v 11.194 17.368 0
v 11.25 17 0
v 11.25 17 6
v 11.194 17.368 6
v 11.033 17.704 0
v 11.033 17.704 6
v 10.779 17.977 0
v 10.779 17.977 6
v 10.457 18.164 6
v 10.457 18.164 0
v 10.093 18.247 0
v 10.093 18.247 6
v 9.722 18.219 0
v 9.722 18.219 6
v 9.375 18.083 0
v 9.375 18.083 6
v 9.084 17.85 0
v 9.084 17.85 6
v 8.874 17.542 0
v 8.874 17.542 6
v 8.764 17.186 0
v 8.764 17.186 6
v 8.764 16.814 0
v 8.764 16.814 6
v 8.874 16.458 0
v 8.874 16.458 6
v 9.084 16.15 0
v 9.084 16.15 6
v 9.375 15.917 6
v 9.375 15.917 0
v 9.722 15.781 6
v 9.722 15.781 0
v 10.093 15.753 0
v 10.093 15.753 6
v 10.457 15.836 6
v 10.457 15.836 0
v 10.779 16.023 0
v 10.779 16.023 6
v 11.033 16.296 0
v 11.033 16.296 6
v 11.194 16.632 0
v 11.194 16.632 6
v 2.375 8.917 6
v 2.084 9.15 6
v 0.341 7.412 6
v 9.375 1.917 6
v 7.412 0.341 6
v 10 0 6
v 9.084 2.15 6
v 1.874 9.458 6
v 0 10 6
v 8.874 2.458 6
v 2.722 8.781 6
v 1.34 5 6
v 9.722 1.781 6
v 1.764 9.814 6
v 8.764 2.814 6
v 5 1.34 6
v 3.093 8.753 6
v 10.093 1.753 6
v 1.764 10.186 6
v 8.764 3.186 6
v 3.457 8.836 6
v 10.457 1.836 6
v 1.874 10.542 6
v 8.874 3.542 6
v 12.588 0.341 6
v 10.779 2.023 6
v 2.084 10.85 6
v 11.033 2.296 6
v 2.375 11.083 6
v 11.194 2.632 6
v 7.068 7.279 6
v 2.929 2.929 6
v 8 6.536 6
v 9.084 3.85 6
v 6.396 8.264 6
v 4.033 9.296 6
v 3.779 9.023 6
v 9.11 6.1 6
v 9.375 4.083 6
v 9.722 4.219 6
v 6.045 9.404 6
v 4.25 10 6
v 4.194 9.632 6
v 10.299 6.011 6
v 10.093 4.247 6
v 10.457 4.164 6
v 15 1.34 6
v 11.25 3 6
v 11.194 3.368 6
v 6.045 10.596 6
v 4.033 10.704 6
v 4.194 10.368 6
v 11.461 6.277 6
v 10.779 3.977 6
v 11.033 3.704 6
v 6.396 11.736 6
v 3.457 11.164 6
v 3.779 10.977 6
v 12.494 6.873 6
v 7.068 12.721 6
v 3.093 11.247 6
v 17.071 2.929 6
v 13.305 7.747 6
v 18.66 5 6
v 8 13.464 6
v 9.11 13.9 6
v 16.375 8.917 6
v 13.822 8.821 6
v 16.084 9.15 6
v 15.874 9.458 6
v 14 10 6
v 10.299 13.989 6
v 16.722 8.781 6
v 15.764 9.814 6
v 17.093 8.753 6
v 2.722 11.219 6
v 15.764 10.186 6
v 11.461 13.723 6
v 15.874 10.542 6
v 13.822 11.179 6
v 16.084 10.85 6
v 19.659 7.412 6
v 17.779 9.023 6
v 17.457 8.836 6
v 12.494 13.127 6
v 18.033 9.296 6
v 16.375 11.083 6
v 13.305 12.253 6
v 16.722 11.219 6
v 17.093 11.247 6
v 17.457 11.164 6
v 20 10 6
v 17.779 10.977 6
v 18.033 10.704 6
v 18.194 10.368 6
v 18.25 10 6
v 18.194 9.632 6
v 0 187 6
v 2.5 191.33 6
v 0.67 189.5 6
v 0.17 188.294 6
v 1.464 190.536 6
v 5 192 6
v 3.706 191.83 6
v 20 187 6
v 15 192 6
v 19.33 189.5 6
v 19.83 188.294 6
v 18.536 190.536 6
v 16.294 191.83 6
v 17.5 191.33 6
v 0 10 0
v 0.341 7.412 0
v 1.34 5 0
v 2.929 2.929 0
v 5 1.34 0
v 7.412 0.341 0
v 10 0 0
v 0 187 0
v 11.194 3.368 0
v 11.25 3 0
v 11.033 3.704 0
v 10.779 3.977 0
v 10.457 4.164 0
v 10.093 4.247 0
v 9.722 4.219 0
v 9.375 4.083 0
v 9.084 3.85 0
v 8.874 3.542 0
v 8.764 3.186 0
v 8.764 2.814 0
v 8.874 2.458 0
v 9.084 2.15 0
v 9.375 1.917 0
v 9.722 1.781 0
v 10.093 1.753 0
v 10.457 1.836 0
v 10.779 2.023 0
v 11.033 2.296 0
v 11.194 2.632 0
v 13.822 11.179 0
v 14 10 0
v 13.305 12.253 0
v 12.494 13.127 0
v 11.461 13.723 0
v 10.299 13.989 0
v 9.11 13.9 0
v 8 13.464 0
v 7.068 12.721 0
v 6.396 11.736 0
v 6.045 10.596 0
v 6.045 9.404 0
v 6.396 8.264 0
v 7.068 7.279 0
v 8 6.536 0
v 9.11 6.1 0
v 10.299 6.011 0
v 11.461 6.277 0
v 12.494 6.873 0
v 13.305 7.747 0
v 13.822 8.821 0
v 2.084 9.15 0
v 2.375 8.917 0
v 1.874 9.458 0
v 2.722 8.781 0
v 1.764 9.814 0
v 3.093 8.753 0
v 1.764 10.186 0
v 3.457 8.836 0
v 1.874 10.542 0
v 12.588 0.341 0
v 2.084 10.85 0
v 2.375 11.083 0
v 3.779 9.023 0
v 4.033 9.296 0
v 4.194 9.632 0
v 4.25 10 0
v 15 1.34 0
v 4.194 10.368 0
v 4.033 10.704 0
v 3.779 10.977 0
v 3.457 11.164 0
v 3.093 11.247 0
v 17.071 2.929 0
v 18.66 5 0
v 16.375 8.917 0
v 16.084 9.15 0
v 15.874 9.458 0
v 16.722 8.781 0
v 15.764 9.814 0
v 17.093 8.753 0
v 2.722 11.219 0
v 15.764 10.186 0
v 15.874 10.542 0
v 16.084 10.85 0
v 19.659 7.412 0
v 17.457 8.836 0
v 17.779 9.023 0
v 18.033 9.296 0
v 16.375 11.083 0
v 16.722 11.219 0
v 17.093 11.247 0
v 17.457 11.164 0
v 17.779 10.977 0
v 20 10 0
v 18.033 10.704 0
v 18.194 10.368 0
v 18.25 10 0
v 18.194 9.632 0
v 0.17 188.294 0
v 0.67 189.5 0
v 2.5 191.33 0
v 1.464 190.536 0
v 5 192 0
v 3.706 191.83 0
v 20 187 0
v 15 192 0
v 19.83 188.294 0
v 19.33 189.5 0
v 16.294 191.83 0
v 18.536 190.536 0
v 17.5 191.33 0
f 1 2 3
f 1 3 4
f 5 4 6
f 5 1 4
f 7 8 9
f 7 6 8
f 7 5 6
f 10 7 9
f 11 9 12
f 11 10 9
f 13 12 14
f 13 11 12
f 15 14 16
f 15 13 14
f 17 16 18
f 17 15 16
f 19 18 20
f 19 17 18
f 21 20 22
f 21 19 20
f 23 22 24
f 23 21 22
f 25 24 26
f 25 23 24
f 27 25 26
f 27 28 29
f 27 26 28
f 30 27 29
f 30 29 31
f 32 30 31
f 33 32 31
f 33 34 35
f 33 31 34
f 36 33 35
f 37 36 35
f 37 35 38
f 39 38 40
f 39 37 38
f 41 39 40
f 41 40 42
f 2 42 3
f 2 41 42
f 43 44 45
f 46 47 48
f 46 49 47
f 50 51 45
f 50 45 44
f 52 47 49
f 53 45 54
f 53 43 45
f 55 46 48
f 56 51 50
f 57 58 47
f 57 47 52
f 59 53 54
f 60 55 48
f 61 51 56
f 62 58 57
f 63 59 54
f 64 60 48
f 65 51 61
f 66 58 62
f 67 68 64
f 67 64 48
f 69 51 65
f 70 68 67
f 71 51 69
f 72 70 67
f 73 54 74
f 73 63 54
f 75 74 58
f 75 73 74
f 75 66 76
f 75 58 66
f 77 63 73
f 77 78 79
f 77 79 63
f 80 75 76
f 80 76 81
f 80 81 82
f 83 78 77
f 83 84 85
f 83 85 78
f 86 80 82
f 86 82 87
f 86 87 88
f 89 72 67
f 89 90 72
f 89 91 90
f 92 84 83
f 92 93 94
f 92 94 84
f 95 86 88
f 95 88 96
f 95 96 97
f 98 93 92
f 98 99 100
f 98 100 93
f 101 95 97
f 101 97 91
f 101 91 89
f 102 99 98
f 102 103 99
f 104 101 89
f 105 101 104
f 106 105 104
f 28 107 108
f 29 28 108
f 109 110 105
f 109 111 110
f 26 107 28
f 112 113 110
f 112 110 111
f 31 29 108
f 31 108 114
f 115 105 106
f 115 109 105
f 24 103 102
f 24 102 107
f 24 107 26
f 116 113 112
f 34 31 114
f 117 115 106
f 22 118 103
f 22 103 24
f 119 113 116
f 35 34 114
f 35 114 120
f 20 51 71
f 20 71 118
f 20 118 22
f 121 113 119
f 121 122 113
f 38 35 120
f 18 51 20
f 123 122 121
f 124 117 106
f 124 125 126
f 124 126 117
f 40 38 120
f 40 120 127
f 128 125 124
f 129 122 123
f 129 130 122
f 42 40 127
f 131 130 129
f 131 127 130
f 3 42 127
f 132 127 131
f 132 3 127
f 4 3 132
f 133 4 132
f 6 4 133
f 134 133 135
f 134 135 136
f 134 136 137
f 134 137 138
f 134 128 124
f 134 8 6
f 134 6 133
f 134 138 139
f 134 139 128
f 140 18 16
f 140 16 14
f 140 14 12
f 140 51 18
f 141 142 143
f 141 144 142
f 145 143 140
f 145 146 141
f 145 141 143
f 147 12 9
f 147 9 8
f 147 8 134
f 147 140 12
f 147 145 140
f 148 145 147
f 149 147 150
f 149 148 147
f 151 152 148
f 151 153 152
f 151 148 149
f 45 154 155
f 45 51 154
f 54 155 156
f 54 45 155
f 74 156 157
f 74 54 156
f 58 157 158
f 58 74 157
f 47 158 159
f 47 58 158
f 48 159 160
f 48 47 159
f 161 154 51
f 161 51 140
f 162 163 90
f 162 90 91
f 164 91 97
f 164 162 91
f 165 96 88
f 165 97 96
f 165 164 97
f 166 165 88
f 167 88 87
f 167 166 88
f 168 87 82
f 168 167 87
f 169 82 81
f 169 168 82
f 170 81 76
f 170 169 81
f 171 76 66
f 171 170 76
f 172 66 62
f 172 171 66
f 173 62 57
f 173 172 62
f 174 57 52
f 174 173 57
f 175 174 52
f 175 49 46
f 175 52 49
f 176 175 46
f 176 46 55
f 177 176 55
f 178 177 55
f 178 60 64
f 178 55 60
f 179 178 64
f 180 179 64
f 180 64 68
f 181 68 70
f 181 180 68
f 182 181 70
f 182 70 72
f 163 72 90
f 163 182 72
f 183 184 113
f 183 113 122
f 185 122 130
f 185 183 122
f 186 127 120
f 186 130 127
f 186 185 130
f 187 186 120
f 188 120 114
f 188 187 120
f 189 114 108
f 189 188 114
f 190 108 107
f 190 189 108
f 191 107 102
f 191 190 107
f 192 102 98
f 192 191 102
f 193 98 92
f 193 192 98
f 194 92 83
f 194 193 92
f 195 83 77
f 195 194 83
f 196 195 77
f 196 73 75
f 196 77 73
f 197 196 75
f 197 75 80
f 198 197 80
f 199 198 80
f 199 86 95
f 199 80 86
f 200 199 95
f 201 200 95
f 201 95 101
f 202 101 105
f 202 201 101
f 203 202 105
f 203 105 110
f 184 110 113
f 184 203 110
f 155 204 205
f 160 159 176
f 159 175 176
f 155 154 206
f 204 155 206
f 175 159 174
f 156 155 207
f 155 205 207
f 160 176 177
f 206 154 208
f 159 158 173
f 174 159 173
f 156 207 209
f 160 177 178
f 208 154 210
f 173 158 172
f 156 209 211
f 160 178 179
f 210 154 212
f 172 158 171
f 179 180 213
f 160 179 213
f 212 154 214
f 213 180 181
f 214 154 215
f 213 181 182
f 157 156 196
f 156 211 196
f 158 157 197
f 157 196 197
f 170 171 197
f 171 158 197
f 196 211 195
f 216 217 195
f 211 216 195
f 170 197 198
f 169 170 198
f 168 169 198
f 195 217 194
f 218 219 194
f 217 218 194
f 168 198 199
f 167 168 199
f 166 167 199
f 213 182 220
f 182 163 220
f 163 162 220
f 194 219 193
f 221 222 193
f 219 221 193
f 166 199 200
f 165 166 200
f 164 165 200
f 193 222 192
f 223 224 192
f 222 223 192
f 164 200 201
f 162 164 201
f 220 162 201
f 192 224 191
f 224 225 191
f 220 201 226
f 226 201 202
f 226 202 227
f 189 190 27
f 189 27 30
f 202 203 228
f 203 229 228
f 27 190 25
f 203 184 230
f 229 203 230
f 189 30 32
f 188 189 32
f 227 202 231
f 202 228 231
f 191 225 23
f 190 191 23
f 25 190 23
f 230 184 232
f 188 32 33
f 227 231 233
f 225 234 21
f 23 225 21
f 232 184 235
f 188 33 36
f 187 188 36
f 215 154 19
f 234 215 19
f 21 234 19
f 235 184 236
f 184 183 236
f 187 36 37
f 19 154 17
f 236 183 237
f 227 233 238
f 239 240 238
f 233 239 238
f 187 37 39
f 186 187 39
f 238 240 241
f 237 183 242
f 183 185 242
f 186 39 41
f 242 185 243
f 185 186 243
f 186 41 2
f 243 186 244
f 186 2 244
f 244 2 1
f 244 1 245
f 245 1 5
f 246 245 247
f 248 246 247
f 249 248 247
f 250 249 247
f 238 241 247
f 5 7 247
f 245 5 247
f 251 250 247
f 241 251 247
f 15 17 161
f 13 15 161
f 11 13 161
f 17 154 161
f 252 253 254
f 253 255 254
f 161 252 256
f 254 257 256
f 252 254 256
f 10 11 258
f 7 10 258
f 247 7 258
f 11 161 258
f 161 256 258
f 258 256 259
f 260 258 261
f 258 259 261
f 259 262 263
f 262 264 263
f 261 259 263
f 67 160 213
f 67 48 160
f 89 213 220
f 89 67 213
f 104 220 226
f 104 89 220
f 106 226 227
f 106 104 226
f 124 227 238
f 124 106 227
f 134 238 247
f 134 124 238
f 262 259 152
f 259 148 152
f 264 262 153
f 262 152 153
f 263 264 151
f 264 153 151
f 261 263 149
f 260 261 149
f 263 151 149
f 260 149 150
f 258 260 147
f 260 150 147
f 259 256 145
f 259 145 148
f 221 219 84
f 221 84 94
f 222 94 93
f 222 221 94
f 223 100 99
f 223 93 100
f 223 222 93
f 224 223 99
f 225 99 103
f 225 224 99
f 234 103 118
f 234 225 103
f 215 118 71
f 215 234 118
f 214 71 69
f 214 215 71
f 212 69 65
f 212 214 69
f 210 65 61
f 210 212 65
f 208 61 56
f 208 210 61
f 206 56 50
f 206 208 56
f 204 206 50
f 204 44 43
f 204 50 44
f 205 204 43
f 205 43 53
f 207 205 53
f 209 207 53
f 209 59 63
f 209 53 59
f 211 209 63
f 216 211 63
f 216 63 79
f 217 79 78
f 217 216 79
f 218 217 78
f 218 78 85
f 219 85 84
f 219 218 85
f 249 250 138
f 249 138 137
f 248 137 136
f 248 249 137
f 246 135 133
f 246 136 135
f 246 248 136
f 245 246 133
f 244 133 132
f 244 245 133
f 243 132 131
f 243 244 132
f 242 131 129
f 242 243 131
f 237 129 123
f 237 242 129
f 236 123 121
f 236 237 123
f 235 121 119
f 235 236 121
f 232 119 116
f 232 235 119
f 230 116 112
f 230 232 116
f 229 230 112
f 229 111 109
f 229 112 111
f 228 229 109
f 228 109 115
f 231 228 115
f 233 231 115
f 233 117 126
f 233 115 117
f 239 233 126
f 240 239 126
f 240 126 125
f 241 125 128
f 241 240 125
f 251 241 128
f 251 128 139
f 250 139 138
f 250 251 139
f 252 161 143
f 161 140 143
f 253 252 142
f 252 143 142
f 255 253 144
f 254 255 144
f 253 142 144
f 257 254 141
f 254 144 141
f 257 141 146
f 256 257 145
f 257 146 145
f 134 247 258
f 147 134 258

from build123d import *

# Parameters (mm, degrees)
ESQUISSE1_W                  = 20
ESQUISSE1_H                  = 192
BOSS_EXTRU_1_DEPTH           = 6
ENL_V_MAT_EXTRU_1_DEPTH      = 194.132079158
ENL_V_MAT_EXTRU_1_DEPTH_BACK = 194.132079158
ESQUISSE2_R                  = 4
CONG_1_R                     = 10
CONG_2_R                     = 5
ENL_V_MAT_EXTRU_2_DEPTH      = 194.132079158
ENL_V_MAT_EXTRU_2_DEPTH_BACK = 194.132079158
ESQUISSE3_R                  = 1.25


with BuildPart() as part:
    # Esquisse1 → Boss.-Extru.1 (new body)
    with BuildSketch(Plane.XY):
        with Locations((10, 96)):
            Rectangle(ESQUISSE1_W, ESQUISSE1_H)
    extrude(amount=BOSS_EXTRU_1_DEPTH)

    # Esquisse2 → Enlèv. mat.-Extru.1 (cut, two sides: drawn at the far end of the back side and taken through both)
    with BuildSketch(Plane.XY.offset(6).offset(-ENL_V_MAT_EXTRU_1_DEPTH_BACK)):
        with Locations((10, 10)):
            Circle(ESQUISSE2_R)
    extrude(amount=ENL_V_MAT_EXTRU_1_DEPTH + ENL_V_MAT_EXTRU_1_DEPTH_BACK, mode=Mode.SUBTRACT)

    # Congé1
    cong_1_edges = [part.edges().sort_by_distance(p)[0] for p in [
        (20, 0, 3),
        (0, 0, 3),
    ]]
    fillet(cong_1_edges, radius=CONG_1_R - 0.0001)  # a hair under: the kernel refuses the full size

    # Congé2
    cong_2_edges = [part.edges().sort_by_distance(p)[0] for p in [
        (0, 192, 3),
        (20, 192, 3),
    ]]
    fillet(cong_2_edges, radius=CONG_2_R)

    # Esquisse3 → Enlèv. mat.-Extru.2 (cut, two sides: drawn at the far end of the back side and taken through both)
    with BuildSketch(Plane.XY.offset(6).offset(-ENL_V_MAT_EXTRU_2_DEPTH_BACK)):
        with Locations((10, 17)):
            Circle(ESQUISSE3_R)
        with Locations((17, 10)):
            Circle(ESQUISSE3_R)
        with Locations((10, 3)):
            Circle(ESQUISSE3_R)
        with Locations((3, 10)):
            Circle(ESQUISSE3_R)
    extrude(amount=ENL_V_MAT_EXTRU_2_DEPTH + ENL_V_MAT_EXTRU_2_DEPTH_BACK, mode=Mode.SUBTRACT)


solid = part.part
